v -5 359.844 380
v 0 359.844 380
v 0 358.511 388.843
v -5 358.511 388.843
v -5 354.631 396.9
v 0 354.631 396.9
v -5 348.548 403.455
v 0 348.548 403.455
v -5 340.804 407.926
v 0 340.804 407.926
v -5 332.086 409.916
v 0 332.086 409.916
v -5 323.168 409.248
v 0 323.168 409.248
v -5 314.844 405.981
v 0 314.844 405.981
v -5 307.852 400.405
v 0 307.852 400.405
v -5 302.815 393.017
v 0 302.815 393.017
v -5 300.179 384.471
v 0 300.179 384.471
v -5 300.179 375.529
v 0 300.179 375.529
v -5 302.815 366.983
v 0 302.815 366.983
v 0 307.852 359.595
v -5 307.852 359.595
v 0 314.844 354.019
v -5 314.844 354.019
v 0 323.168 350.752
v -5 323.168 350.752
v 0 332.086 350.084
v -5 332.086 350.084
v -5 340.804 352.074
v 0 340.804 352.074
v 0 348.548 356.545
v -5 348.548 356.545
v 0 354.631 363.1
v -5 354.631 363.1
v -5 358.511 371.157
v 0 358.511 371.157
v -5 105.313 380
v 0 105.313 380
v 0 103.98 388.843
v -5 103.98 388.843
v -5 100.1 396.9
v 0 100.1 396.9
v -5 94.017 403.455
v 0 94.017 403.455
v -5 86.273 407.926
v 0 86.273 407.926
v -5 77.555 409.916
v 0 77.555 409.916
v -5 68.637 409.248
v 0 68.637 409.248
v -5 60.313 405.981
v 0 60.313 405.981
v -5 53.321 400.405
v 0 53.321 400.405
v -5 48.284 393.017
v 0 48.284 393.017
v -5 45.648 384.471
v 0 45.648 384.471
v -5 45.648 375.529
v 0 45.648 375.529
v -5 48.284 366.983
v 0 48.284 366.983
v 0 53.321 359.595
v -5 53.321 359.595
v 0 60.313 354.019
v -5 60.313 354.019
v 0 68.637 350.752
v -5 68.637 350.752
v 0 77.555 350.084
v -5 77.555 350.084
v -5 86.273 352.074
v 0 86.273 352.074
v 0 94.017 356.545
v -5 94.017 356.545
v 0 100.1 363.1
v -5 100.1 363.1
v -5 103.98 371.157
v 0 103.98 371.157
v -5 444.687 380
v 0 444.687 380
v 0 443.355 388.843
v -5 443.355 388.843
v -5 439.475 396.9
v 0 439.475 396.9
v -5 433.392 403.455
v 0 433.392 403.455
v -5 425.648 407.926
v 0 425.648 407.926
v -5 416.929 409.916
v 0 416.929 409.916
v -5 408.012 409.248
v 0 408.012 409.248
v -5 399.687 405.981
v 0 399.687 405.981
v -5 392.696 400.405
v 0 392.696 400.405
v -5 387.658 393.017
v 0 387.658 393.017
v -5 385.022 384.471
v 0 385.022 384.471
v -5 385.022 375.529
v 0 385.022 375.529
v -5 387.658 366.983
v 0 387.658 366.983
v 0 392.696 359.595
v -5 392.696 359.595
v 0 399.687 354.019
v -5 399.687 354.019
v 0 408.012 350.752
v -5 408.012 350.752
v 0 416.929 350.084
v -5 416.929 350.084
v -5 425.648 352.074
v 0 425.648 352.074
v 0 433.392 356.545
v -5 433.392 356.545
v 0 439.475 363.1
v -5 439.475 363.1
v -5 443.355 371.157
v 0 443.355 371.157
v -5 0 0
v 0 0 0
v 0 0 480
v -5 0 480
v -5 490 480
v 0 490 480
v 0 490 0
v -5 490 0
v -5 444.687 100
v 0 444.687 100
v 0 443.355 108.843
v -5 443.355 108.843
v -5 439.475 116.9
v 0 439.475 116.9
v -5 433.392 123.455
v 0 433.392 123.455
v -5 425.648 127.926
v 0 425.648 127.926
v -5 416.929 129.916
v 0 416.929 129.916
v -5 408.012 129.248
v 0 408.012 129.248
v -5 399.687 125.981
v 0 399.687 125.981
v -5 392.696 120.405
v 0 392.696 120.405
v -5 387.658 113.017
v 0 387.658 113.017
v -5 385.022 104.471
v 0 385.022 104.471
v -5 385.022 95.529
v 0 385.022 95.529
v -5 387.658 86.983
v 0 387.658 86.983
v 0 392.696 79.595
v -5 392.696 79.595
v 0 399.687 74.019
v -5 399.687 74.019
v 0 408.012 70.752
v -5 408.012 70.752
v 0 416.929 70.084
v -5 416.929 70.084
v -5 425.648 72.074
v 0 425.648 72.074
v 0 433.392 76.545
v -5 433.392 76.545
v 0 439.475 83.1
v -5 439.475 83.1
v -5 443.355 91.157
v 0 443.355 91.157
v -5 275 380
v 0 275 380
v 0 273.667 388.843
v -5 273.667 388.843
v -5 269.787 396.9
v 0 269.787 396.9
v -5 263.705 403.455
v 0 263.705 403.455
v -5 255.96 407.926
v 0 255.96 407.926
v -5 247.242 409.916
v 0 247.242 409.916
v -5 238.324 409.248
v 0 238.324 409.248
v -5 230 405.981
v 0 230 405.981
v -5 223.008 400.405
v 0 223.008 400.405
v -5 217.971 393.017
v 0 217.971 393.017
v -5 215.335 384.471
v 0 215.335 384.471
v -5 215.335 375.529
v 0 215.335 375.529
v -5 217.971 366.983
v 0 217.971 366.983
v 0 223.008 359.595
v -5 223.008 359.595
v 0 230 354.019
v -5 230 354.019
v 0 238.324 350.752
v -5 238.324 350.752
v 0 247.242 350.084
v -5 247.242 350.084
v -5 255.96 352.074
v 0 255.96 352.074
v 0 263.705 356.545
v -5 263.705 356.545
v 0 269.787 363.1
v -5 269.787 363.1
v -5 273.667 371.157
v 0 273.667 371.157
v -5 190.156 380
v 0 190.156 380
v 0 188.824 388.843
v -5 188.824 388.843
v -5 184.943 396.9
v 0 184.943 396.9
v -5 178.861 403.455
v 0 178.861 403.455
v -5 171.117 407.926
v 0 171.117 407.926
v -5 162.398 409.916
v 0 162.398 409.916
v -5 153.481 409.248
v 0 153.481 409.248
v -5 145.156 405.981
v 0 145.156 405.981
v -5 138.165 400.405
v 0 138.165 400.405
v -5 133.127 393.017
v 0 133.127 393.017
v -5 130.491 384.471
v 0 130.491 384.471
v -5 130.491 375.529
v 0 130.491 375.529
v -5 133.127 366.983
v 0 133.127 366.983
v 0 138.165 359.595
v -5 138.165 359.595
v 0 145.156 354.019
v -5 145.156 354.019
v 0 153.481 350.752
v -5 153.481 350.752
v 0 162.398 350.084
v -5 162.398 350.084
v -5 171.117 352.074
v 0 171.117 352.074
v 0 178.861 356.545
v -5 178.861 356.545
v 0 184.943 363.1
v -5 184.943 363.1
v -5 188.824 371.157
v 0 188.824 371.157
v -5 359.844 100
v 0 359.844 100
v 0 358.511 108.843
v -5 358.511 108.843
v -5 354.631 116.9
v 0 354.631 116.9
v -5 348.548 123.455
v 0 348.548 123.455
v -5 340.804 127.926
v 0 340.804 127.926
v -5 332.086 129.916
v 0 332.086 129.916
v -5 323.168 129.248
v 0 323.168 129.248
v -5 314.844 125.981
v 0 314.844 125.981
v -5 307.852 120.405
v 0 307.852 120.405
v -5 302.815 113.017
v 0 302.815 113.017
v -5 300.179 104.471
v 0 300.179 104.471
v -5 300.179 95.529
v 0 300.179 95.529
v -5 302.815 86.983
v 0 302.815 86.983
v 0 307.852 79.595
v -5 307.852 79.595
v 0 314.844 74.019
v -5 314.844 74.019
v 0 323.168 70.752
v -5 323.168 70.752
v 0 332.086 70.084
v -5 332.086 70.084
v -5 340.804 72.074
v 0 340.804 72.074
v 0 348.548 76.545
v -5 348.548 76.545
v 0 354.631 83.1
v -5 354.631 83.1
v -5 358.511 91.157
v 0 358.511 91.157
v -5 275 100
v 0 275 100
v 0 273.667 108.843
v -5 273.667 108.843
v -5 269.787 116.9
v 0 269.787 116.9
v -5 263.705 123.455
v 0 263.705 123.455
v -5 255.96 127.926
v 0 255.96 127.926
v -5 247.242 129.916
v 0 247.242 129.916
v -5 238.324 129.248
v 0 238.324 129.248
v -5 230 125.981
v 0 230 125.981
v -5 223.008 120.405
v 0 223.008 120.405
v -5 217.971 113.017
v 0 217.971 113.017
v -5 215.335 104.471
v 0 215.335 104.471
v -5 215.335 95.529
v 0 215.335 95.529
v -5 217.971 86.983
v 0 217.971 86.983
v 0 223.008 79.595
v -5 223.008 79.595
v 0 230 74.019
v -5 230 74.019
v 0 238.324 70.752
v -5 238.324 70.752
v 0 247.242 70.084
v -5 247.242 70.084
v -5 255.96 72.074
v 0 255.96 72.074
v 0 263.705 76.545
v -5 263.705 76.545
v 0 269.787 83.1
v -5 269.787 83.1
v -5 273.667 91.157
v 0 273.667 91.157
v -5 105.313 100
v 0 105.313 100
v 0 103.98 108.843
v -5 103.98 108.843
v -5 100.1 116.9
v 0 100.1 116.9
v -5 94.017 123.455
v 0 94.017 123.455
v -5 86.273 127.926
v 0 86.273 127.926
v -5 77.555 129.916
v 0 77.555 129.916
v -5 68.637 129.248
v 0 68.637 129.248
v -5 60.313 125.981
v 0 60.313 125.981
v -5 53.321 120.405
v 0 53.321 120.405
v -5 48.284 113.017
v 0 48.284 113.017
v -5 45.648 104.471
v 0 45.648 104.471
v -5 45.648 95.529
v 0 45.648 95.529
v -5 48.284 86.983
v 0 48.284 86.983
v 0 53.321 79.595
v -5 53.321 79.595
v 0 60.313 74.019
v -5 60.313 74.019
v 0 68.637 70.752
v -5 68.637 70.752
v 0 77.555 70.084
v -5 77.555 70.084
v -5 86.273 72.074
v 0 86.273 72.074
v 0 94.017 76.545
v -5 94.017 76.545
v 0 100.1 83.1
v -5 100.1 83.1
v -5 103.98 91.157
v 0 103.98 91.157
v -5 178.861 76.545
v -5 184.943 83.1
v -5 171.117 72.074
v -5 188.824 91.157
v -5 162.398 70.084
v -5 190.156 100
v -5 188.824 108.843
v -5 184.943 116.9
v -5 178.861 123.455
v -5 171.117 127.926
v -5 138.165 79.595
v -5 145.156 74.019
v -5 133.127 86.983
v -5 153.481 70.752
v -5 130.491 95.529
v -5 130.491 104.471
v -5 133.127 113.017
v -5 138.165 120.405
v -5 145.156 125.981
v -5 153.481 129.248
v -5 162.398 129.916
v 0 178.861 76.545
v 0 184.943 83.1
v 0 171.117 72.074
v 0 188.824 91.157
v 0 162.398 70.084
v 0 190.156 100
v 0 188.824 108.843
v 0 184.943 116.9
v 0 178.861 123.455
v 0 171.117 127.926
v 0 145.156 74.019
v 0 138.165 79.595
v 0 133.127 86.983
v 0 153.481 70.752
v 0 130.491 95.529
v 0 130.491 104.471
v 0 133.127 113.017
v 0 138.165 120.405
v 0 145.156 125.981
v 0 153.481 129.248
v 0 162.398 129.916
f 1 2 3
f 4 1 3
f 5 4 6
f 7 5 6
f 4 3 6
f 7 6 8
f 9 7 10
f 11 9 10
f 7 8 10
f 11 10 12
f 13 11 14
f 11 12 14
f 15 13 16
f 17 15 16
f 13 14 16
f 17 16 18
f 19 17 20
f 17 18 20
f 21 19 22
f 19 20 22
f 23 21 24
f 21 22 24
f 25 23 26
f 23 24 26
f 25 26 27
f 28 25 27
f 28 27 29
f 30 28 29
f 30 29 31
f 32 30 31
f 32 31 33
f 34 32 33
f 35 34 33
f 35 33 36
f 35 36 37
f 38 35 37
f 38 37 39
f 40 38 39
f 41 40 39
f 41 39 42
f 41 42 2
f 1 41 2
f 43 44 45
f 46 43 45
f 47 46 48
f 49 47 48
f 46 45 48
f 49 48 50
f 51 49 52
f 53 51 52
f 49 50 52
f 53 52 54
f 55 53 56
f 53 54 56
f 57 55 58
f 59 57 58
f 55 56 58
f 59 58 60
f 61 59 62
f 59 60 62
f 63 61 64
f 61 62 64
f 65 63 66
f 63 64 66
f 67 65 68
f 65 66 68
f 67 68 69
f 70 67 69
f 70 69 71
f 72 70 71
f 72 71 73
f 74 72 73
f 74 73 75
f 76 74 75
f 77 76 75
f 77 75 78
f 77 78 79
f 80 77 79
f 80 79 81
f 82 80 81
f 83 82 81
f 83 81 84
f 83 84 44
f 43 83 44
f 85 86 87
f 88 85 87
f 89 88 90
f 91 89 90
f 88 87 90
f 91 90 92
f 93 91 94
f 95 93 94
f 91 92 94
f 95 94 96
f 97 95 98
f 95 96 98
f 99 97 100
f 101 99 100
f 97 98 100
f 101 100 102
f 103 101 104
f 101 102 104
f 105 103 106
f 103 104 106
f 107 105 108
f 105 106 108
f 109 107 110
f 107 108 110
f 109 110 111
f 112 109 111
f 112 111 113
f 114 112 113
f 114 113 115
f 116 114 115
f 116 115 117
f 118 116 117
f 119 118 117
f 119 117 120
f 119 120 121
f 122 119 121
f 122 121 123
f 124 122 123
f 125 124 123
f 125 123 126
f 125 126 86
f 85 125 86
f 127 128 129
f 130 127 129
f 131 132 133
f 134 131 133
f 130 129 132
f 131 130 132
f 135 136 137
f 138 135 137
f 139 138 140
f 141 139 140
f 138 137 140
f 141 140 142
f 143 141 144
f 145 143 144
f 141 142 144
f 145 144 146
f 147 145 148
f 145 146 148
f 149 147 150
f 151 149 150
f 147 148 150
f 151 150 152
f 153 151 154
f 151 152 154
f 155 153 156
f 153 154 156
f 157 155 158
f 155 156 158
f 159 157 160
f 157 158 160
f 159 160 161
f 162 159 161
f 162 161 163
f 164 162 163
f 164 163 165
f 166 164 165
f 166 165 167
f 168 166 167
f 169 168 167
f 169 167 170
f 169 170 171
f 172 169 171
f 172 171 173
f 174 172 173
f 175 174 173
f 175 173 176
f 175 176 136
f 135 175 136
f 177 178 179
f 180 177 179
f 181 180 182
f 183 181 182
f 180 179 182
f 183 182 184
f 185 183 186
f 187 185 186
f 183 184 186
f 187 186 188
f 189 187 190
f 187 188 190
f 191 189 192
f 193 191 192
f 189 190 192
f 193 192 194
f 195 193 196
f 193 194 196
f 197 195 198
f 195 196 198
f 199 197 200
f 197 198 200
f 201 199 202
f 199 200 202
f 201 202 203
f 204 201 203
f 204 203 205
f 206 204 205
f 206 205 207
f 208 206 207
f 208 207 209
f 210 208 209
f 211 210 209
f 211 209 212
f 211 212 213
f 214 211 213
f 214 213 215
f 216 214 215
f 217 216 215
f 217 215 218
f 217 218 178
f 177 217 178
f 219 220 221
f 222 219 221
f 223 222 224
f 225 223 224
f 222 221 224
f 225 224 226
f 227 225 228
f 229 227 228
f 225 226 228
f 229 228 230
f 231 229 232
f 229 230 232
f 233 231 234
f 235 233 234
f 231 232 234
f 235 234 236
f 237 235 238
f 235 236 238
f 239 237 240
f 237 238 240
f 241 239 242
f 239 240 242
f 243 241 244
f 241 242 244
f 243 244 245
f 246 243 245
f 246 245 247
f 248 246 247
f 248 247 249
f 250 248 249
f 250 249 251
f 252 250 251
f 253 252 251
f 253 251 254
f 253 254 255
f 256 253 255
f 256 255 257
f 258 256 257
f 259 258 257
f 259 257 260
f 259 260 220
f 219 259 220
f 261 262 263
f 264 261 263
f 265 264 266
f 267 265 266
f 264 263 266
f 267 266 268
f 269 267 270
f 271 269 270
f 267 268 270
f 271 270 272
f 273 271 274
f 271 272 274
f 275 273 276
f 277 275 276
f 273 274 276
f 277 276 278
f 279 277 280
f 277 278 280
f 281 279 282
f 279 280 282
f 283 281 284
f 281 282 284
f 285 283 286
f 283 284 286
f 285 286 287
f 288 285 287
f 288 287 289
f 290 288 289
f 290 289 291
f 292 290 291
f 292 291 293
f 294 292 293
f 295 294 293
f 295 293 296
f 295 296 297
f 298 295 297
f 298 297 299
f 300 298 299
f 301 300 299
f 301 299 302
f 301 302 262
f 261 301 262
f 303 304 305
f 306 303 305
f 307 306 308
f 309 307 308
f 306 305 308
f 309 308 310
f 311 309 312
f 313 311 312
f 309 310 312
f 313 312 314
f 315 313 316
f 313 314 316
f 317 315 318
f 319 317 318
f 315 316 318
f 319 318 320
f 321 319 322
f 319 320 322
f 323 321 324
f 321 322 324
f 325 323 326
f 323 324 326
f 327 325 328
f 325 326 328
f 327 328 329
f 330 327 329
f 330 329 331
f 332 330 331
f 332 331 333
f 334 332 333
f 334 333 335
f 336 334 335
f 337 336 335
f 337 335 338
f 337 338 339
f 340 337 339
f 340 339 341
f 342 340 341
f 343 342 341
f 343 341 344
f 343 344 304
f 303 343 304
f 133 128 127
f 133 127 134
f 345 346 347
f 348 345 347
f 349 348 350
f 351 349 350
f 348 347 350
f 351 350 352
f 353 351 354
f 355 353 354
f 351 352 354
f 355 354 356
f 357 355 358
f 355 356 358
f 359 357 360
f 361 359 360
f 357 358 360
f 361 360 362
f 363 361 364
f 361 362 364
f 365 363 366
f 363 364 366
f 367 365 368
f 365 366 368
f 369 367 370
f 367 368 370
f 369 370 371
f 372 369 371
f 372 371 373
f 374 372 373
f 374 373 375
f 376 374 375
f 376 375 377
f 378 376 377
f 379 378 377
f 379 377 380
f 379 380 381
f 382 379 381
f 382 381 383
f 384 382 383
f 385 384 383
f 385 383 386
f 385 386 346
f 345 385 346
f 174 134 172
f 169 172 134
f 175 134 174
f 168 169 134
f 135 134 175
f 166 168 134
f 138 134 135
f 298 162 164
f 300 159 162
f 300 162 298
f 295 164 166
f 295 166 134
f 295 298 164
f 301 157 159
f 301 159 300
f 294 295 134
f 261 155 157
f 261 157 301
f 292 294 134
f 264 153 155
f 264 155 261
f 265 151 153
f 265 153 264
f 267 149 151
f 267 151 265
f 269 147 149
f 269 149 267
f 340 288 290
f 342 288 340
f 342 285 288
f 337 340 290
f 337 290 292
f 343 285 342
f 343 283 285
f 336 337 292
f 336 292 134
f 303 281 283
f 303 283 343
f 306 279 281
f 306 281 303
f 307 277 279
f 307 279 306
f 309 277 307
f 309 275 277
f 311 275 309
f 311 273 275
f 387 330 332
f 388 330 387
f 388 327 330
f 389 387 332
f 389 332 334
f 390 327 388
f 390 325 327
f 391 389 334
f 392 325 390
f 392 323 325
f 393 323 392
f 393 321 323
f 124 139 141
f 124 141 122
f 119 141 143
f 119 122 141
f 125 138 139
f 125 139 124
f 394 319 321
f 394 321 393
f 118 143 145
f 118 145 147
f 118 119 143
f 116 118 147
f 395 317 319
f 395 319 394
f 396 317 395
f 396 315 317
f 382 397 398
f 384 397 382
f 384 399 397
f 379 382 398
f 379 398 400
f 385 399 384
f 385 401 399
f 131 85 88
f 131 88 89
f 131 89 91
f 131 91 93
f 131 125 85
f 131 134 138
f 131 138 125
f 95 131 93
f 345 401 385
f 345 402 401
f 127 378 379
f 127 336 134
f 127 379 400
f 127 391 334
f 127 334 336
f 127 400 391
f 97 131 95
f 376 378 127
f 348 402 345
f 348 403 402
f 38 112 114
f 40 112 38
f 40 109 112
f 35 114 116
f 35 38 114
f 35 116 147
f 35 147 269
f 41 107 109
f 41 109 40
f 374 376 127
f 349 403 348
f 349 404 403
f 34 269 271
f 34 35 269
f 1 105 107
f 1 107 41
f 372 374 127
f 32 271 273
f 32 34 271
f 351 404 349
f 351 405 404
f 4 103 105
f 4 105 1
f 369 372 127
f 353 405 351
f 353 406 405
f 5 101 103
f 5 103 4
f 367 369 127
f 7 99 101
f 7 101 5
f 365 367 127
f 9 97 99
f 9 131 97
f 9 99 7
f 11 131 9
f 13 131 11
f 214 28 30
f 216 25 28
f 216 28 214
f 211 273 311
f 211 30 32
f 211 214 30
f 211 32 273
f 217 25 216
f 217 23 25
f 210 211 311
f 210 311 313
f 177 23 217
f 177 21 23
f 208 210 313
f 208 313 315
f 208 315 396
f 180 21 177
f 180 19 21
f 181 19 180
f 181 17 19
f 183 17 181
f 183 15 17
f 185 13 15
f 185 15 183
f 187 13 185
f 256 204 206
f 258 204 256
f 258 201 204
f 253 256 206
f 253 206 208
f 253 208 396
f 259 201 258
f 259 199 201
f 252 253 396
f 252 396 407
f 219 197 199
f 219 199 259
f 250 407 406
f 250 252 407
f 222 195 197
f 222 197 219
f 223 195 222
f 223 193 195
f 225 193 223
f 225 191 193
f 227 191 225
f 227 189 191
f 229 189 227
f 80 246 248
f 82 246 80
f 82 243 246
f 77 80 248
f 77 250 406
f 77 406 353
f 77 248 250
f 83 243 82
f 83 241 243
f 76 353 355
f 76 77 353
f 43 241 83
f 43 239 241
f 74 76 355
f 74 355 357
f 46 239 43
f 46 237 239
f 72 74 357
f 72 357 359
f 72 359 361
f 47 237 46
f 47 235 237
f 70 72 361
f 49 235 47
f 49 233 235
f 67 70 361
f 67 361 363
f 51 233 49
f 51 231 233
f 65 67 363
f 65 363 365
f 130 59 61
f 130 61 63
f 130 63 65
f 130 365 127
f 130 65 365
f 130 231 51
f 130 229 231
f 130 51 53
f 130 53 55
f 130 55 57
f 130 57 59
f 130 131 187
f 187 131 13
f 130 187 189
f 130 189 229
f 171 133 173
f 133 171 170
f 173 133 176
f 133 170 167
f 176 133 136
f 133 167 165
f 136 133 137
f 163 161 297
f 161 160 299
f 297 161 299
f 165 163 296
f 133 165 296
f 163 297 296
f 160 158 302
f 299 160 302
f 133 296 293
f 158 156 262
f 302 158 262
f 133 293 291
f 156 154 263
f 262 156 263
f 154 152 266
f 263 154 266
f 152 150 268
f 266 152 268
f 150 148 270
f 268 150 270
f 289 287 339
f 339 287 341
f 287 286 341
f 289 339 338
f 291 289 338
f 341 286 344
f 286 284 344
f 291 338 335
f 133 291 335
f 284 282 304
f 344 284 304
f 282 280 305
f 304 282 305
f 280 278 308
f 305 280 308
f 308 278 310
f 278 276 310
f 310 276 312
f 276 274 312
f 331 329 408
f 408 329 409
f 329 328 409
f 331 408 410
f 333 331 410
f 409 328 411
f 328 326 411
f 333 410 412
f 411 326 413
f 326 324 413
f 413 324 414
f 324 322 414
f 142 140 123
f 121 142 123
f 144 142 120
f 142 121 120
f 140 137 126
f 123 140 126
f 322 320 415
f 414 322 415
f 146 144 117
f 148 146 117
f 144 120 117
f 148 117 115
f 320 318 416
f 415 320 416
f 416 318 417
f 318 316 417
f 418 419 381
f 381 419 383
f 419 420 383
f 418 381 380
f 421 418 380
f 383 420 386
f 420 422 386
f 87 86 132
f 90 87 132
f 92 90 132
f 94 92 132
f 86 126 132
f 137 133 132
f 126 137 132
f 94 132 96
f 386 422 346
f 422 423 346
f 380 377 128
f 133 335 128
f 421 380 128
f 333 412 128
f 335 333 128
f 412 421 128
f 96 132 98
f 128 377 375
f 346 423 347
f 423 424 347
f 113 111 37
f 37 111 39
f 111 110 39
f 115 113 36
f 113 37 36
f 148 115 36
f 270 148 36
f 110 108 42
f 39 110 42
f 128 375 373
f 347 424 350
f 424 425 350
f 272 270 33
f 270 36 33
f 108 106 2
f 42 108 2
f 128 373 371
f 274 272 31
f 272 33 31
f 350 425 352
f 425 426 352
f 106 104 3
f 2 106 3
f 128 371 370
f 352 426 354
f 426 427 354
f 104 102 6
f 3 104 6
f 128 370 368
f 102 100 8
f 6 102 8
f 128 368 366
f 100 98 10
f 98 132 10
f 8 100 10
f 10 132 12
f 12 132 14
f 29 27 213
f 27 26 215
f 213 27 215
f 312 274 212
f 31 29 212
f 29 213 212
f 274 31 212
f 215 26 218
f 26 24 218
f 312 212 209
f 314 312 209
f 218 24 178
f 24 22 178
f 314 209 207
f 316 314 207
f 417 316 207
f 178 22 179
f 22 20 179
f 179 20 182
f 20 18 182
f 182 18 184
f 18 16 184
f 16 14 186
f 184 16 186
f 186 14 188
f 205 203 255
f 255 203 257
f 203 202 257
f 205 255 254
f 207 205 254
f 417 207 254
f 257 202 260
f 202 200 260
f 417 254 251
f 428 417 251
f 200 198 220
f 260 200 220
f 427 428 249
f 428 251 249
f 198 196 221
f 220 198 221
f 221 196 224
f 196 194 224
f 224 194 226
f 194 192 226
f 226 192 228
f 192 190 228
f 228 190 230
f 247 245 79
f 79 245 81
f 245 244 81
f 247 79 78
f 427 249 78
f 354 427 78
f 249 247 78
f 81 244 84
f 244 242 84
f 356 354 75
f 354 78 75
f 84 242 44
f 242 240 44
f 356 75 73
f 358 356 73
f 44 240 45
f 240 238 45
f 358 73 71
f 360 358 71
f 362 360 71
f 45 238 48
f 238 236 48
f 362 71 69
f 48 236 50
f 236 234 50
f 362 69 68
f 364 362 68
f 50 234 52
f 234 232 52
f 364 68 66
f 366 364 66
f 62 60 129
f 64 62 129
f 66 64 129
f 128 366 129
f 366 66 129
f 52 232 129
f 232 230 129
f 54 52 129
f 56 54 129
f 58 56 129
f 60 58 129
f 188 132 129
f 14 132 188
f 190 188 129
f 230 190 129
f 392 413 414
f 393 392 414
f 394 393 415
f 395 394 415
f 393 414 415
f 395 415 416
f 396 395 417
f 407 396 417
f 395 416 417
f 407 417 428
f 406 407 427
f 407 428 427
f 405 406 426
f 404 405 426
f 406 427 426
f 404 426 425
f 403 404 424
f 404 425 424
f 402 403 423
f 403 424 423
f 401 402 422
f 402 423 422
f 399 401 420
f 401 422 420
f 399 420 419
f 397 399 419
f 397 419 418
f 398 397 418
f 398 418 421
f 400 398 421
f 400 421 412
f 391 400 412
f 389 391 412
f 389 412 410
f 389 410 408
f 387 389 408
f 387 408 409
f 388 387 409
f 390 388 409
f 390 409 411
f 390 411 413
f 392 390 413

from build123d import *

# Parameters (mm, degrees)
PAD_DEPTH    = 5
SKETCH002_R  = 30
POCKET_DEPTH = 5.001


with BuildPart() as part:
    # Sketch → Pad (new body)
    with BuildSketch(Plane.YZ):
        Polygon((0, 0), (0, 480), (490, 480), (490, 0), (245, 0), align=None)
    extrude(amount=-PAD_DEPTH)

    # Sketch002 (on Face6 of Pad) → Pocket (cut, through all)
    with BuildSketch(Plane.YZ):
        with Locations((245, 380)):
            Circle(SKETCH002_R)
        with Locations((245, 100)):
            Circle(SKETCH002_R)
        with Locations((75.312646, 380)):
            Circle(SKETCH002_R)
        with Locations((75.312646, 100)):
            Circle(SKETCH002_R)
        with Locations((160.156323, 100)):
            Circle(SKETCH002_R)
        with Locations((329.843677, 100)):
            Circle(SKETCH002_R)
        with Locations((414.687354, 100)):
            Circle(SKETCH002_R)
        with Locations((414.687354, 380)):
            Circle(SKETCH002_R)
        with Locations((329.843677, 380)):
            Circle(SKETCH002_R)
        with Locations((160.156323, 380)):
            Circle(SKETCH002_R)
    extrude(amount=-POCKET_DEPTH, mode=Mode.SUBTRACT)


solid = part.part
